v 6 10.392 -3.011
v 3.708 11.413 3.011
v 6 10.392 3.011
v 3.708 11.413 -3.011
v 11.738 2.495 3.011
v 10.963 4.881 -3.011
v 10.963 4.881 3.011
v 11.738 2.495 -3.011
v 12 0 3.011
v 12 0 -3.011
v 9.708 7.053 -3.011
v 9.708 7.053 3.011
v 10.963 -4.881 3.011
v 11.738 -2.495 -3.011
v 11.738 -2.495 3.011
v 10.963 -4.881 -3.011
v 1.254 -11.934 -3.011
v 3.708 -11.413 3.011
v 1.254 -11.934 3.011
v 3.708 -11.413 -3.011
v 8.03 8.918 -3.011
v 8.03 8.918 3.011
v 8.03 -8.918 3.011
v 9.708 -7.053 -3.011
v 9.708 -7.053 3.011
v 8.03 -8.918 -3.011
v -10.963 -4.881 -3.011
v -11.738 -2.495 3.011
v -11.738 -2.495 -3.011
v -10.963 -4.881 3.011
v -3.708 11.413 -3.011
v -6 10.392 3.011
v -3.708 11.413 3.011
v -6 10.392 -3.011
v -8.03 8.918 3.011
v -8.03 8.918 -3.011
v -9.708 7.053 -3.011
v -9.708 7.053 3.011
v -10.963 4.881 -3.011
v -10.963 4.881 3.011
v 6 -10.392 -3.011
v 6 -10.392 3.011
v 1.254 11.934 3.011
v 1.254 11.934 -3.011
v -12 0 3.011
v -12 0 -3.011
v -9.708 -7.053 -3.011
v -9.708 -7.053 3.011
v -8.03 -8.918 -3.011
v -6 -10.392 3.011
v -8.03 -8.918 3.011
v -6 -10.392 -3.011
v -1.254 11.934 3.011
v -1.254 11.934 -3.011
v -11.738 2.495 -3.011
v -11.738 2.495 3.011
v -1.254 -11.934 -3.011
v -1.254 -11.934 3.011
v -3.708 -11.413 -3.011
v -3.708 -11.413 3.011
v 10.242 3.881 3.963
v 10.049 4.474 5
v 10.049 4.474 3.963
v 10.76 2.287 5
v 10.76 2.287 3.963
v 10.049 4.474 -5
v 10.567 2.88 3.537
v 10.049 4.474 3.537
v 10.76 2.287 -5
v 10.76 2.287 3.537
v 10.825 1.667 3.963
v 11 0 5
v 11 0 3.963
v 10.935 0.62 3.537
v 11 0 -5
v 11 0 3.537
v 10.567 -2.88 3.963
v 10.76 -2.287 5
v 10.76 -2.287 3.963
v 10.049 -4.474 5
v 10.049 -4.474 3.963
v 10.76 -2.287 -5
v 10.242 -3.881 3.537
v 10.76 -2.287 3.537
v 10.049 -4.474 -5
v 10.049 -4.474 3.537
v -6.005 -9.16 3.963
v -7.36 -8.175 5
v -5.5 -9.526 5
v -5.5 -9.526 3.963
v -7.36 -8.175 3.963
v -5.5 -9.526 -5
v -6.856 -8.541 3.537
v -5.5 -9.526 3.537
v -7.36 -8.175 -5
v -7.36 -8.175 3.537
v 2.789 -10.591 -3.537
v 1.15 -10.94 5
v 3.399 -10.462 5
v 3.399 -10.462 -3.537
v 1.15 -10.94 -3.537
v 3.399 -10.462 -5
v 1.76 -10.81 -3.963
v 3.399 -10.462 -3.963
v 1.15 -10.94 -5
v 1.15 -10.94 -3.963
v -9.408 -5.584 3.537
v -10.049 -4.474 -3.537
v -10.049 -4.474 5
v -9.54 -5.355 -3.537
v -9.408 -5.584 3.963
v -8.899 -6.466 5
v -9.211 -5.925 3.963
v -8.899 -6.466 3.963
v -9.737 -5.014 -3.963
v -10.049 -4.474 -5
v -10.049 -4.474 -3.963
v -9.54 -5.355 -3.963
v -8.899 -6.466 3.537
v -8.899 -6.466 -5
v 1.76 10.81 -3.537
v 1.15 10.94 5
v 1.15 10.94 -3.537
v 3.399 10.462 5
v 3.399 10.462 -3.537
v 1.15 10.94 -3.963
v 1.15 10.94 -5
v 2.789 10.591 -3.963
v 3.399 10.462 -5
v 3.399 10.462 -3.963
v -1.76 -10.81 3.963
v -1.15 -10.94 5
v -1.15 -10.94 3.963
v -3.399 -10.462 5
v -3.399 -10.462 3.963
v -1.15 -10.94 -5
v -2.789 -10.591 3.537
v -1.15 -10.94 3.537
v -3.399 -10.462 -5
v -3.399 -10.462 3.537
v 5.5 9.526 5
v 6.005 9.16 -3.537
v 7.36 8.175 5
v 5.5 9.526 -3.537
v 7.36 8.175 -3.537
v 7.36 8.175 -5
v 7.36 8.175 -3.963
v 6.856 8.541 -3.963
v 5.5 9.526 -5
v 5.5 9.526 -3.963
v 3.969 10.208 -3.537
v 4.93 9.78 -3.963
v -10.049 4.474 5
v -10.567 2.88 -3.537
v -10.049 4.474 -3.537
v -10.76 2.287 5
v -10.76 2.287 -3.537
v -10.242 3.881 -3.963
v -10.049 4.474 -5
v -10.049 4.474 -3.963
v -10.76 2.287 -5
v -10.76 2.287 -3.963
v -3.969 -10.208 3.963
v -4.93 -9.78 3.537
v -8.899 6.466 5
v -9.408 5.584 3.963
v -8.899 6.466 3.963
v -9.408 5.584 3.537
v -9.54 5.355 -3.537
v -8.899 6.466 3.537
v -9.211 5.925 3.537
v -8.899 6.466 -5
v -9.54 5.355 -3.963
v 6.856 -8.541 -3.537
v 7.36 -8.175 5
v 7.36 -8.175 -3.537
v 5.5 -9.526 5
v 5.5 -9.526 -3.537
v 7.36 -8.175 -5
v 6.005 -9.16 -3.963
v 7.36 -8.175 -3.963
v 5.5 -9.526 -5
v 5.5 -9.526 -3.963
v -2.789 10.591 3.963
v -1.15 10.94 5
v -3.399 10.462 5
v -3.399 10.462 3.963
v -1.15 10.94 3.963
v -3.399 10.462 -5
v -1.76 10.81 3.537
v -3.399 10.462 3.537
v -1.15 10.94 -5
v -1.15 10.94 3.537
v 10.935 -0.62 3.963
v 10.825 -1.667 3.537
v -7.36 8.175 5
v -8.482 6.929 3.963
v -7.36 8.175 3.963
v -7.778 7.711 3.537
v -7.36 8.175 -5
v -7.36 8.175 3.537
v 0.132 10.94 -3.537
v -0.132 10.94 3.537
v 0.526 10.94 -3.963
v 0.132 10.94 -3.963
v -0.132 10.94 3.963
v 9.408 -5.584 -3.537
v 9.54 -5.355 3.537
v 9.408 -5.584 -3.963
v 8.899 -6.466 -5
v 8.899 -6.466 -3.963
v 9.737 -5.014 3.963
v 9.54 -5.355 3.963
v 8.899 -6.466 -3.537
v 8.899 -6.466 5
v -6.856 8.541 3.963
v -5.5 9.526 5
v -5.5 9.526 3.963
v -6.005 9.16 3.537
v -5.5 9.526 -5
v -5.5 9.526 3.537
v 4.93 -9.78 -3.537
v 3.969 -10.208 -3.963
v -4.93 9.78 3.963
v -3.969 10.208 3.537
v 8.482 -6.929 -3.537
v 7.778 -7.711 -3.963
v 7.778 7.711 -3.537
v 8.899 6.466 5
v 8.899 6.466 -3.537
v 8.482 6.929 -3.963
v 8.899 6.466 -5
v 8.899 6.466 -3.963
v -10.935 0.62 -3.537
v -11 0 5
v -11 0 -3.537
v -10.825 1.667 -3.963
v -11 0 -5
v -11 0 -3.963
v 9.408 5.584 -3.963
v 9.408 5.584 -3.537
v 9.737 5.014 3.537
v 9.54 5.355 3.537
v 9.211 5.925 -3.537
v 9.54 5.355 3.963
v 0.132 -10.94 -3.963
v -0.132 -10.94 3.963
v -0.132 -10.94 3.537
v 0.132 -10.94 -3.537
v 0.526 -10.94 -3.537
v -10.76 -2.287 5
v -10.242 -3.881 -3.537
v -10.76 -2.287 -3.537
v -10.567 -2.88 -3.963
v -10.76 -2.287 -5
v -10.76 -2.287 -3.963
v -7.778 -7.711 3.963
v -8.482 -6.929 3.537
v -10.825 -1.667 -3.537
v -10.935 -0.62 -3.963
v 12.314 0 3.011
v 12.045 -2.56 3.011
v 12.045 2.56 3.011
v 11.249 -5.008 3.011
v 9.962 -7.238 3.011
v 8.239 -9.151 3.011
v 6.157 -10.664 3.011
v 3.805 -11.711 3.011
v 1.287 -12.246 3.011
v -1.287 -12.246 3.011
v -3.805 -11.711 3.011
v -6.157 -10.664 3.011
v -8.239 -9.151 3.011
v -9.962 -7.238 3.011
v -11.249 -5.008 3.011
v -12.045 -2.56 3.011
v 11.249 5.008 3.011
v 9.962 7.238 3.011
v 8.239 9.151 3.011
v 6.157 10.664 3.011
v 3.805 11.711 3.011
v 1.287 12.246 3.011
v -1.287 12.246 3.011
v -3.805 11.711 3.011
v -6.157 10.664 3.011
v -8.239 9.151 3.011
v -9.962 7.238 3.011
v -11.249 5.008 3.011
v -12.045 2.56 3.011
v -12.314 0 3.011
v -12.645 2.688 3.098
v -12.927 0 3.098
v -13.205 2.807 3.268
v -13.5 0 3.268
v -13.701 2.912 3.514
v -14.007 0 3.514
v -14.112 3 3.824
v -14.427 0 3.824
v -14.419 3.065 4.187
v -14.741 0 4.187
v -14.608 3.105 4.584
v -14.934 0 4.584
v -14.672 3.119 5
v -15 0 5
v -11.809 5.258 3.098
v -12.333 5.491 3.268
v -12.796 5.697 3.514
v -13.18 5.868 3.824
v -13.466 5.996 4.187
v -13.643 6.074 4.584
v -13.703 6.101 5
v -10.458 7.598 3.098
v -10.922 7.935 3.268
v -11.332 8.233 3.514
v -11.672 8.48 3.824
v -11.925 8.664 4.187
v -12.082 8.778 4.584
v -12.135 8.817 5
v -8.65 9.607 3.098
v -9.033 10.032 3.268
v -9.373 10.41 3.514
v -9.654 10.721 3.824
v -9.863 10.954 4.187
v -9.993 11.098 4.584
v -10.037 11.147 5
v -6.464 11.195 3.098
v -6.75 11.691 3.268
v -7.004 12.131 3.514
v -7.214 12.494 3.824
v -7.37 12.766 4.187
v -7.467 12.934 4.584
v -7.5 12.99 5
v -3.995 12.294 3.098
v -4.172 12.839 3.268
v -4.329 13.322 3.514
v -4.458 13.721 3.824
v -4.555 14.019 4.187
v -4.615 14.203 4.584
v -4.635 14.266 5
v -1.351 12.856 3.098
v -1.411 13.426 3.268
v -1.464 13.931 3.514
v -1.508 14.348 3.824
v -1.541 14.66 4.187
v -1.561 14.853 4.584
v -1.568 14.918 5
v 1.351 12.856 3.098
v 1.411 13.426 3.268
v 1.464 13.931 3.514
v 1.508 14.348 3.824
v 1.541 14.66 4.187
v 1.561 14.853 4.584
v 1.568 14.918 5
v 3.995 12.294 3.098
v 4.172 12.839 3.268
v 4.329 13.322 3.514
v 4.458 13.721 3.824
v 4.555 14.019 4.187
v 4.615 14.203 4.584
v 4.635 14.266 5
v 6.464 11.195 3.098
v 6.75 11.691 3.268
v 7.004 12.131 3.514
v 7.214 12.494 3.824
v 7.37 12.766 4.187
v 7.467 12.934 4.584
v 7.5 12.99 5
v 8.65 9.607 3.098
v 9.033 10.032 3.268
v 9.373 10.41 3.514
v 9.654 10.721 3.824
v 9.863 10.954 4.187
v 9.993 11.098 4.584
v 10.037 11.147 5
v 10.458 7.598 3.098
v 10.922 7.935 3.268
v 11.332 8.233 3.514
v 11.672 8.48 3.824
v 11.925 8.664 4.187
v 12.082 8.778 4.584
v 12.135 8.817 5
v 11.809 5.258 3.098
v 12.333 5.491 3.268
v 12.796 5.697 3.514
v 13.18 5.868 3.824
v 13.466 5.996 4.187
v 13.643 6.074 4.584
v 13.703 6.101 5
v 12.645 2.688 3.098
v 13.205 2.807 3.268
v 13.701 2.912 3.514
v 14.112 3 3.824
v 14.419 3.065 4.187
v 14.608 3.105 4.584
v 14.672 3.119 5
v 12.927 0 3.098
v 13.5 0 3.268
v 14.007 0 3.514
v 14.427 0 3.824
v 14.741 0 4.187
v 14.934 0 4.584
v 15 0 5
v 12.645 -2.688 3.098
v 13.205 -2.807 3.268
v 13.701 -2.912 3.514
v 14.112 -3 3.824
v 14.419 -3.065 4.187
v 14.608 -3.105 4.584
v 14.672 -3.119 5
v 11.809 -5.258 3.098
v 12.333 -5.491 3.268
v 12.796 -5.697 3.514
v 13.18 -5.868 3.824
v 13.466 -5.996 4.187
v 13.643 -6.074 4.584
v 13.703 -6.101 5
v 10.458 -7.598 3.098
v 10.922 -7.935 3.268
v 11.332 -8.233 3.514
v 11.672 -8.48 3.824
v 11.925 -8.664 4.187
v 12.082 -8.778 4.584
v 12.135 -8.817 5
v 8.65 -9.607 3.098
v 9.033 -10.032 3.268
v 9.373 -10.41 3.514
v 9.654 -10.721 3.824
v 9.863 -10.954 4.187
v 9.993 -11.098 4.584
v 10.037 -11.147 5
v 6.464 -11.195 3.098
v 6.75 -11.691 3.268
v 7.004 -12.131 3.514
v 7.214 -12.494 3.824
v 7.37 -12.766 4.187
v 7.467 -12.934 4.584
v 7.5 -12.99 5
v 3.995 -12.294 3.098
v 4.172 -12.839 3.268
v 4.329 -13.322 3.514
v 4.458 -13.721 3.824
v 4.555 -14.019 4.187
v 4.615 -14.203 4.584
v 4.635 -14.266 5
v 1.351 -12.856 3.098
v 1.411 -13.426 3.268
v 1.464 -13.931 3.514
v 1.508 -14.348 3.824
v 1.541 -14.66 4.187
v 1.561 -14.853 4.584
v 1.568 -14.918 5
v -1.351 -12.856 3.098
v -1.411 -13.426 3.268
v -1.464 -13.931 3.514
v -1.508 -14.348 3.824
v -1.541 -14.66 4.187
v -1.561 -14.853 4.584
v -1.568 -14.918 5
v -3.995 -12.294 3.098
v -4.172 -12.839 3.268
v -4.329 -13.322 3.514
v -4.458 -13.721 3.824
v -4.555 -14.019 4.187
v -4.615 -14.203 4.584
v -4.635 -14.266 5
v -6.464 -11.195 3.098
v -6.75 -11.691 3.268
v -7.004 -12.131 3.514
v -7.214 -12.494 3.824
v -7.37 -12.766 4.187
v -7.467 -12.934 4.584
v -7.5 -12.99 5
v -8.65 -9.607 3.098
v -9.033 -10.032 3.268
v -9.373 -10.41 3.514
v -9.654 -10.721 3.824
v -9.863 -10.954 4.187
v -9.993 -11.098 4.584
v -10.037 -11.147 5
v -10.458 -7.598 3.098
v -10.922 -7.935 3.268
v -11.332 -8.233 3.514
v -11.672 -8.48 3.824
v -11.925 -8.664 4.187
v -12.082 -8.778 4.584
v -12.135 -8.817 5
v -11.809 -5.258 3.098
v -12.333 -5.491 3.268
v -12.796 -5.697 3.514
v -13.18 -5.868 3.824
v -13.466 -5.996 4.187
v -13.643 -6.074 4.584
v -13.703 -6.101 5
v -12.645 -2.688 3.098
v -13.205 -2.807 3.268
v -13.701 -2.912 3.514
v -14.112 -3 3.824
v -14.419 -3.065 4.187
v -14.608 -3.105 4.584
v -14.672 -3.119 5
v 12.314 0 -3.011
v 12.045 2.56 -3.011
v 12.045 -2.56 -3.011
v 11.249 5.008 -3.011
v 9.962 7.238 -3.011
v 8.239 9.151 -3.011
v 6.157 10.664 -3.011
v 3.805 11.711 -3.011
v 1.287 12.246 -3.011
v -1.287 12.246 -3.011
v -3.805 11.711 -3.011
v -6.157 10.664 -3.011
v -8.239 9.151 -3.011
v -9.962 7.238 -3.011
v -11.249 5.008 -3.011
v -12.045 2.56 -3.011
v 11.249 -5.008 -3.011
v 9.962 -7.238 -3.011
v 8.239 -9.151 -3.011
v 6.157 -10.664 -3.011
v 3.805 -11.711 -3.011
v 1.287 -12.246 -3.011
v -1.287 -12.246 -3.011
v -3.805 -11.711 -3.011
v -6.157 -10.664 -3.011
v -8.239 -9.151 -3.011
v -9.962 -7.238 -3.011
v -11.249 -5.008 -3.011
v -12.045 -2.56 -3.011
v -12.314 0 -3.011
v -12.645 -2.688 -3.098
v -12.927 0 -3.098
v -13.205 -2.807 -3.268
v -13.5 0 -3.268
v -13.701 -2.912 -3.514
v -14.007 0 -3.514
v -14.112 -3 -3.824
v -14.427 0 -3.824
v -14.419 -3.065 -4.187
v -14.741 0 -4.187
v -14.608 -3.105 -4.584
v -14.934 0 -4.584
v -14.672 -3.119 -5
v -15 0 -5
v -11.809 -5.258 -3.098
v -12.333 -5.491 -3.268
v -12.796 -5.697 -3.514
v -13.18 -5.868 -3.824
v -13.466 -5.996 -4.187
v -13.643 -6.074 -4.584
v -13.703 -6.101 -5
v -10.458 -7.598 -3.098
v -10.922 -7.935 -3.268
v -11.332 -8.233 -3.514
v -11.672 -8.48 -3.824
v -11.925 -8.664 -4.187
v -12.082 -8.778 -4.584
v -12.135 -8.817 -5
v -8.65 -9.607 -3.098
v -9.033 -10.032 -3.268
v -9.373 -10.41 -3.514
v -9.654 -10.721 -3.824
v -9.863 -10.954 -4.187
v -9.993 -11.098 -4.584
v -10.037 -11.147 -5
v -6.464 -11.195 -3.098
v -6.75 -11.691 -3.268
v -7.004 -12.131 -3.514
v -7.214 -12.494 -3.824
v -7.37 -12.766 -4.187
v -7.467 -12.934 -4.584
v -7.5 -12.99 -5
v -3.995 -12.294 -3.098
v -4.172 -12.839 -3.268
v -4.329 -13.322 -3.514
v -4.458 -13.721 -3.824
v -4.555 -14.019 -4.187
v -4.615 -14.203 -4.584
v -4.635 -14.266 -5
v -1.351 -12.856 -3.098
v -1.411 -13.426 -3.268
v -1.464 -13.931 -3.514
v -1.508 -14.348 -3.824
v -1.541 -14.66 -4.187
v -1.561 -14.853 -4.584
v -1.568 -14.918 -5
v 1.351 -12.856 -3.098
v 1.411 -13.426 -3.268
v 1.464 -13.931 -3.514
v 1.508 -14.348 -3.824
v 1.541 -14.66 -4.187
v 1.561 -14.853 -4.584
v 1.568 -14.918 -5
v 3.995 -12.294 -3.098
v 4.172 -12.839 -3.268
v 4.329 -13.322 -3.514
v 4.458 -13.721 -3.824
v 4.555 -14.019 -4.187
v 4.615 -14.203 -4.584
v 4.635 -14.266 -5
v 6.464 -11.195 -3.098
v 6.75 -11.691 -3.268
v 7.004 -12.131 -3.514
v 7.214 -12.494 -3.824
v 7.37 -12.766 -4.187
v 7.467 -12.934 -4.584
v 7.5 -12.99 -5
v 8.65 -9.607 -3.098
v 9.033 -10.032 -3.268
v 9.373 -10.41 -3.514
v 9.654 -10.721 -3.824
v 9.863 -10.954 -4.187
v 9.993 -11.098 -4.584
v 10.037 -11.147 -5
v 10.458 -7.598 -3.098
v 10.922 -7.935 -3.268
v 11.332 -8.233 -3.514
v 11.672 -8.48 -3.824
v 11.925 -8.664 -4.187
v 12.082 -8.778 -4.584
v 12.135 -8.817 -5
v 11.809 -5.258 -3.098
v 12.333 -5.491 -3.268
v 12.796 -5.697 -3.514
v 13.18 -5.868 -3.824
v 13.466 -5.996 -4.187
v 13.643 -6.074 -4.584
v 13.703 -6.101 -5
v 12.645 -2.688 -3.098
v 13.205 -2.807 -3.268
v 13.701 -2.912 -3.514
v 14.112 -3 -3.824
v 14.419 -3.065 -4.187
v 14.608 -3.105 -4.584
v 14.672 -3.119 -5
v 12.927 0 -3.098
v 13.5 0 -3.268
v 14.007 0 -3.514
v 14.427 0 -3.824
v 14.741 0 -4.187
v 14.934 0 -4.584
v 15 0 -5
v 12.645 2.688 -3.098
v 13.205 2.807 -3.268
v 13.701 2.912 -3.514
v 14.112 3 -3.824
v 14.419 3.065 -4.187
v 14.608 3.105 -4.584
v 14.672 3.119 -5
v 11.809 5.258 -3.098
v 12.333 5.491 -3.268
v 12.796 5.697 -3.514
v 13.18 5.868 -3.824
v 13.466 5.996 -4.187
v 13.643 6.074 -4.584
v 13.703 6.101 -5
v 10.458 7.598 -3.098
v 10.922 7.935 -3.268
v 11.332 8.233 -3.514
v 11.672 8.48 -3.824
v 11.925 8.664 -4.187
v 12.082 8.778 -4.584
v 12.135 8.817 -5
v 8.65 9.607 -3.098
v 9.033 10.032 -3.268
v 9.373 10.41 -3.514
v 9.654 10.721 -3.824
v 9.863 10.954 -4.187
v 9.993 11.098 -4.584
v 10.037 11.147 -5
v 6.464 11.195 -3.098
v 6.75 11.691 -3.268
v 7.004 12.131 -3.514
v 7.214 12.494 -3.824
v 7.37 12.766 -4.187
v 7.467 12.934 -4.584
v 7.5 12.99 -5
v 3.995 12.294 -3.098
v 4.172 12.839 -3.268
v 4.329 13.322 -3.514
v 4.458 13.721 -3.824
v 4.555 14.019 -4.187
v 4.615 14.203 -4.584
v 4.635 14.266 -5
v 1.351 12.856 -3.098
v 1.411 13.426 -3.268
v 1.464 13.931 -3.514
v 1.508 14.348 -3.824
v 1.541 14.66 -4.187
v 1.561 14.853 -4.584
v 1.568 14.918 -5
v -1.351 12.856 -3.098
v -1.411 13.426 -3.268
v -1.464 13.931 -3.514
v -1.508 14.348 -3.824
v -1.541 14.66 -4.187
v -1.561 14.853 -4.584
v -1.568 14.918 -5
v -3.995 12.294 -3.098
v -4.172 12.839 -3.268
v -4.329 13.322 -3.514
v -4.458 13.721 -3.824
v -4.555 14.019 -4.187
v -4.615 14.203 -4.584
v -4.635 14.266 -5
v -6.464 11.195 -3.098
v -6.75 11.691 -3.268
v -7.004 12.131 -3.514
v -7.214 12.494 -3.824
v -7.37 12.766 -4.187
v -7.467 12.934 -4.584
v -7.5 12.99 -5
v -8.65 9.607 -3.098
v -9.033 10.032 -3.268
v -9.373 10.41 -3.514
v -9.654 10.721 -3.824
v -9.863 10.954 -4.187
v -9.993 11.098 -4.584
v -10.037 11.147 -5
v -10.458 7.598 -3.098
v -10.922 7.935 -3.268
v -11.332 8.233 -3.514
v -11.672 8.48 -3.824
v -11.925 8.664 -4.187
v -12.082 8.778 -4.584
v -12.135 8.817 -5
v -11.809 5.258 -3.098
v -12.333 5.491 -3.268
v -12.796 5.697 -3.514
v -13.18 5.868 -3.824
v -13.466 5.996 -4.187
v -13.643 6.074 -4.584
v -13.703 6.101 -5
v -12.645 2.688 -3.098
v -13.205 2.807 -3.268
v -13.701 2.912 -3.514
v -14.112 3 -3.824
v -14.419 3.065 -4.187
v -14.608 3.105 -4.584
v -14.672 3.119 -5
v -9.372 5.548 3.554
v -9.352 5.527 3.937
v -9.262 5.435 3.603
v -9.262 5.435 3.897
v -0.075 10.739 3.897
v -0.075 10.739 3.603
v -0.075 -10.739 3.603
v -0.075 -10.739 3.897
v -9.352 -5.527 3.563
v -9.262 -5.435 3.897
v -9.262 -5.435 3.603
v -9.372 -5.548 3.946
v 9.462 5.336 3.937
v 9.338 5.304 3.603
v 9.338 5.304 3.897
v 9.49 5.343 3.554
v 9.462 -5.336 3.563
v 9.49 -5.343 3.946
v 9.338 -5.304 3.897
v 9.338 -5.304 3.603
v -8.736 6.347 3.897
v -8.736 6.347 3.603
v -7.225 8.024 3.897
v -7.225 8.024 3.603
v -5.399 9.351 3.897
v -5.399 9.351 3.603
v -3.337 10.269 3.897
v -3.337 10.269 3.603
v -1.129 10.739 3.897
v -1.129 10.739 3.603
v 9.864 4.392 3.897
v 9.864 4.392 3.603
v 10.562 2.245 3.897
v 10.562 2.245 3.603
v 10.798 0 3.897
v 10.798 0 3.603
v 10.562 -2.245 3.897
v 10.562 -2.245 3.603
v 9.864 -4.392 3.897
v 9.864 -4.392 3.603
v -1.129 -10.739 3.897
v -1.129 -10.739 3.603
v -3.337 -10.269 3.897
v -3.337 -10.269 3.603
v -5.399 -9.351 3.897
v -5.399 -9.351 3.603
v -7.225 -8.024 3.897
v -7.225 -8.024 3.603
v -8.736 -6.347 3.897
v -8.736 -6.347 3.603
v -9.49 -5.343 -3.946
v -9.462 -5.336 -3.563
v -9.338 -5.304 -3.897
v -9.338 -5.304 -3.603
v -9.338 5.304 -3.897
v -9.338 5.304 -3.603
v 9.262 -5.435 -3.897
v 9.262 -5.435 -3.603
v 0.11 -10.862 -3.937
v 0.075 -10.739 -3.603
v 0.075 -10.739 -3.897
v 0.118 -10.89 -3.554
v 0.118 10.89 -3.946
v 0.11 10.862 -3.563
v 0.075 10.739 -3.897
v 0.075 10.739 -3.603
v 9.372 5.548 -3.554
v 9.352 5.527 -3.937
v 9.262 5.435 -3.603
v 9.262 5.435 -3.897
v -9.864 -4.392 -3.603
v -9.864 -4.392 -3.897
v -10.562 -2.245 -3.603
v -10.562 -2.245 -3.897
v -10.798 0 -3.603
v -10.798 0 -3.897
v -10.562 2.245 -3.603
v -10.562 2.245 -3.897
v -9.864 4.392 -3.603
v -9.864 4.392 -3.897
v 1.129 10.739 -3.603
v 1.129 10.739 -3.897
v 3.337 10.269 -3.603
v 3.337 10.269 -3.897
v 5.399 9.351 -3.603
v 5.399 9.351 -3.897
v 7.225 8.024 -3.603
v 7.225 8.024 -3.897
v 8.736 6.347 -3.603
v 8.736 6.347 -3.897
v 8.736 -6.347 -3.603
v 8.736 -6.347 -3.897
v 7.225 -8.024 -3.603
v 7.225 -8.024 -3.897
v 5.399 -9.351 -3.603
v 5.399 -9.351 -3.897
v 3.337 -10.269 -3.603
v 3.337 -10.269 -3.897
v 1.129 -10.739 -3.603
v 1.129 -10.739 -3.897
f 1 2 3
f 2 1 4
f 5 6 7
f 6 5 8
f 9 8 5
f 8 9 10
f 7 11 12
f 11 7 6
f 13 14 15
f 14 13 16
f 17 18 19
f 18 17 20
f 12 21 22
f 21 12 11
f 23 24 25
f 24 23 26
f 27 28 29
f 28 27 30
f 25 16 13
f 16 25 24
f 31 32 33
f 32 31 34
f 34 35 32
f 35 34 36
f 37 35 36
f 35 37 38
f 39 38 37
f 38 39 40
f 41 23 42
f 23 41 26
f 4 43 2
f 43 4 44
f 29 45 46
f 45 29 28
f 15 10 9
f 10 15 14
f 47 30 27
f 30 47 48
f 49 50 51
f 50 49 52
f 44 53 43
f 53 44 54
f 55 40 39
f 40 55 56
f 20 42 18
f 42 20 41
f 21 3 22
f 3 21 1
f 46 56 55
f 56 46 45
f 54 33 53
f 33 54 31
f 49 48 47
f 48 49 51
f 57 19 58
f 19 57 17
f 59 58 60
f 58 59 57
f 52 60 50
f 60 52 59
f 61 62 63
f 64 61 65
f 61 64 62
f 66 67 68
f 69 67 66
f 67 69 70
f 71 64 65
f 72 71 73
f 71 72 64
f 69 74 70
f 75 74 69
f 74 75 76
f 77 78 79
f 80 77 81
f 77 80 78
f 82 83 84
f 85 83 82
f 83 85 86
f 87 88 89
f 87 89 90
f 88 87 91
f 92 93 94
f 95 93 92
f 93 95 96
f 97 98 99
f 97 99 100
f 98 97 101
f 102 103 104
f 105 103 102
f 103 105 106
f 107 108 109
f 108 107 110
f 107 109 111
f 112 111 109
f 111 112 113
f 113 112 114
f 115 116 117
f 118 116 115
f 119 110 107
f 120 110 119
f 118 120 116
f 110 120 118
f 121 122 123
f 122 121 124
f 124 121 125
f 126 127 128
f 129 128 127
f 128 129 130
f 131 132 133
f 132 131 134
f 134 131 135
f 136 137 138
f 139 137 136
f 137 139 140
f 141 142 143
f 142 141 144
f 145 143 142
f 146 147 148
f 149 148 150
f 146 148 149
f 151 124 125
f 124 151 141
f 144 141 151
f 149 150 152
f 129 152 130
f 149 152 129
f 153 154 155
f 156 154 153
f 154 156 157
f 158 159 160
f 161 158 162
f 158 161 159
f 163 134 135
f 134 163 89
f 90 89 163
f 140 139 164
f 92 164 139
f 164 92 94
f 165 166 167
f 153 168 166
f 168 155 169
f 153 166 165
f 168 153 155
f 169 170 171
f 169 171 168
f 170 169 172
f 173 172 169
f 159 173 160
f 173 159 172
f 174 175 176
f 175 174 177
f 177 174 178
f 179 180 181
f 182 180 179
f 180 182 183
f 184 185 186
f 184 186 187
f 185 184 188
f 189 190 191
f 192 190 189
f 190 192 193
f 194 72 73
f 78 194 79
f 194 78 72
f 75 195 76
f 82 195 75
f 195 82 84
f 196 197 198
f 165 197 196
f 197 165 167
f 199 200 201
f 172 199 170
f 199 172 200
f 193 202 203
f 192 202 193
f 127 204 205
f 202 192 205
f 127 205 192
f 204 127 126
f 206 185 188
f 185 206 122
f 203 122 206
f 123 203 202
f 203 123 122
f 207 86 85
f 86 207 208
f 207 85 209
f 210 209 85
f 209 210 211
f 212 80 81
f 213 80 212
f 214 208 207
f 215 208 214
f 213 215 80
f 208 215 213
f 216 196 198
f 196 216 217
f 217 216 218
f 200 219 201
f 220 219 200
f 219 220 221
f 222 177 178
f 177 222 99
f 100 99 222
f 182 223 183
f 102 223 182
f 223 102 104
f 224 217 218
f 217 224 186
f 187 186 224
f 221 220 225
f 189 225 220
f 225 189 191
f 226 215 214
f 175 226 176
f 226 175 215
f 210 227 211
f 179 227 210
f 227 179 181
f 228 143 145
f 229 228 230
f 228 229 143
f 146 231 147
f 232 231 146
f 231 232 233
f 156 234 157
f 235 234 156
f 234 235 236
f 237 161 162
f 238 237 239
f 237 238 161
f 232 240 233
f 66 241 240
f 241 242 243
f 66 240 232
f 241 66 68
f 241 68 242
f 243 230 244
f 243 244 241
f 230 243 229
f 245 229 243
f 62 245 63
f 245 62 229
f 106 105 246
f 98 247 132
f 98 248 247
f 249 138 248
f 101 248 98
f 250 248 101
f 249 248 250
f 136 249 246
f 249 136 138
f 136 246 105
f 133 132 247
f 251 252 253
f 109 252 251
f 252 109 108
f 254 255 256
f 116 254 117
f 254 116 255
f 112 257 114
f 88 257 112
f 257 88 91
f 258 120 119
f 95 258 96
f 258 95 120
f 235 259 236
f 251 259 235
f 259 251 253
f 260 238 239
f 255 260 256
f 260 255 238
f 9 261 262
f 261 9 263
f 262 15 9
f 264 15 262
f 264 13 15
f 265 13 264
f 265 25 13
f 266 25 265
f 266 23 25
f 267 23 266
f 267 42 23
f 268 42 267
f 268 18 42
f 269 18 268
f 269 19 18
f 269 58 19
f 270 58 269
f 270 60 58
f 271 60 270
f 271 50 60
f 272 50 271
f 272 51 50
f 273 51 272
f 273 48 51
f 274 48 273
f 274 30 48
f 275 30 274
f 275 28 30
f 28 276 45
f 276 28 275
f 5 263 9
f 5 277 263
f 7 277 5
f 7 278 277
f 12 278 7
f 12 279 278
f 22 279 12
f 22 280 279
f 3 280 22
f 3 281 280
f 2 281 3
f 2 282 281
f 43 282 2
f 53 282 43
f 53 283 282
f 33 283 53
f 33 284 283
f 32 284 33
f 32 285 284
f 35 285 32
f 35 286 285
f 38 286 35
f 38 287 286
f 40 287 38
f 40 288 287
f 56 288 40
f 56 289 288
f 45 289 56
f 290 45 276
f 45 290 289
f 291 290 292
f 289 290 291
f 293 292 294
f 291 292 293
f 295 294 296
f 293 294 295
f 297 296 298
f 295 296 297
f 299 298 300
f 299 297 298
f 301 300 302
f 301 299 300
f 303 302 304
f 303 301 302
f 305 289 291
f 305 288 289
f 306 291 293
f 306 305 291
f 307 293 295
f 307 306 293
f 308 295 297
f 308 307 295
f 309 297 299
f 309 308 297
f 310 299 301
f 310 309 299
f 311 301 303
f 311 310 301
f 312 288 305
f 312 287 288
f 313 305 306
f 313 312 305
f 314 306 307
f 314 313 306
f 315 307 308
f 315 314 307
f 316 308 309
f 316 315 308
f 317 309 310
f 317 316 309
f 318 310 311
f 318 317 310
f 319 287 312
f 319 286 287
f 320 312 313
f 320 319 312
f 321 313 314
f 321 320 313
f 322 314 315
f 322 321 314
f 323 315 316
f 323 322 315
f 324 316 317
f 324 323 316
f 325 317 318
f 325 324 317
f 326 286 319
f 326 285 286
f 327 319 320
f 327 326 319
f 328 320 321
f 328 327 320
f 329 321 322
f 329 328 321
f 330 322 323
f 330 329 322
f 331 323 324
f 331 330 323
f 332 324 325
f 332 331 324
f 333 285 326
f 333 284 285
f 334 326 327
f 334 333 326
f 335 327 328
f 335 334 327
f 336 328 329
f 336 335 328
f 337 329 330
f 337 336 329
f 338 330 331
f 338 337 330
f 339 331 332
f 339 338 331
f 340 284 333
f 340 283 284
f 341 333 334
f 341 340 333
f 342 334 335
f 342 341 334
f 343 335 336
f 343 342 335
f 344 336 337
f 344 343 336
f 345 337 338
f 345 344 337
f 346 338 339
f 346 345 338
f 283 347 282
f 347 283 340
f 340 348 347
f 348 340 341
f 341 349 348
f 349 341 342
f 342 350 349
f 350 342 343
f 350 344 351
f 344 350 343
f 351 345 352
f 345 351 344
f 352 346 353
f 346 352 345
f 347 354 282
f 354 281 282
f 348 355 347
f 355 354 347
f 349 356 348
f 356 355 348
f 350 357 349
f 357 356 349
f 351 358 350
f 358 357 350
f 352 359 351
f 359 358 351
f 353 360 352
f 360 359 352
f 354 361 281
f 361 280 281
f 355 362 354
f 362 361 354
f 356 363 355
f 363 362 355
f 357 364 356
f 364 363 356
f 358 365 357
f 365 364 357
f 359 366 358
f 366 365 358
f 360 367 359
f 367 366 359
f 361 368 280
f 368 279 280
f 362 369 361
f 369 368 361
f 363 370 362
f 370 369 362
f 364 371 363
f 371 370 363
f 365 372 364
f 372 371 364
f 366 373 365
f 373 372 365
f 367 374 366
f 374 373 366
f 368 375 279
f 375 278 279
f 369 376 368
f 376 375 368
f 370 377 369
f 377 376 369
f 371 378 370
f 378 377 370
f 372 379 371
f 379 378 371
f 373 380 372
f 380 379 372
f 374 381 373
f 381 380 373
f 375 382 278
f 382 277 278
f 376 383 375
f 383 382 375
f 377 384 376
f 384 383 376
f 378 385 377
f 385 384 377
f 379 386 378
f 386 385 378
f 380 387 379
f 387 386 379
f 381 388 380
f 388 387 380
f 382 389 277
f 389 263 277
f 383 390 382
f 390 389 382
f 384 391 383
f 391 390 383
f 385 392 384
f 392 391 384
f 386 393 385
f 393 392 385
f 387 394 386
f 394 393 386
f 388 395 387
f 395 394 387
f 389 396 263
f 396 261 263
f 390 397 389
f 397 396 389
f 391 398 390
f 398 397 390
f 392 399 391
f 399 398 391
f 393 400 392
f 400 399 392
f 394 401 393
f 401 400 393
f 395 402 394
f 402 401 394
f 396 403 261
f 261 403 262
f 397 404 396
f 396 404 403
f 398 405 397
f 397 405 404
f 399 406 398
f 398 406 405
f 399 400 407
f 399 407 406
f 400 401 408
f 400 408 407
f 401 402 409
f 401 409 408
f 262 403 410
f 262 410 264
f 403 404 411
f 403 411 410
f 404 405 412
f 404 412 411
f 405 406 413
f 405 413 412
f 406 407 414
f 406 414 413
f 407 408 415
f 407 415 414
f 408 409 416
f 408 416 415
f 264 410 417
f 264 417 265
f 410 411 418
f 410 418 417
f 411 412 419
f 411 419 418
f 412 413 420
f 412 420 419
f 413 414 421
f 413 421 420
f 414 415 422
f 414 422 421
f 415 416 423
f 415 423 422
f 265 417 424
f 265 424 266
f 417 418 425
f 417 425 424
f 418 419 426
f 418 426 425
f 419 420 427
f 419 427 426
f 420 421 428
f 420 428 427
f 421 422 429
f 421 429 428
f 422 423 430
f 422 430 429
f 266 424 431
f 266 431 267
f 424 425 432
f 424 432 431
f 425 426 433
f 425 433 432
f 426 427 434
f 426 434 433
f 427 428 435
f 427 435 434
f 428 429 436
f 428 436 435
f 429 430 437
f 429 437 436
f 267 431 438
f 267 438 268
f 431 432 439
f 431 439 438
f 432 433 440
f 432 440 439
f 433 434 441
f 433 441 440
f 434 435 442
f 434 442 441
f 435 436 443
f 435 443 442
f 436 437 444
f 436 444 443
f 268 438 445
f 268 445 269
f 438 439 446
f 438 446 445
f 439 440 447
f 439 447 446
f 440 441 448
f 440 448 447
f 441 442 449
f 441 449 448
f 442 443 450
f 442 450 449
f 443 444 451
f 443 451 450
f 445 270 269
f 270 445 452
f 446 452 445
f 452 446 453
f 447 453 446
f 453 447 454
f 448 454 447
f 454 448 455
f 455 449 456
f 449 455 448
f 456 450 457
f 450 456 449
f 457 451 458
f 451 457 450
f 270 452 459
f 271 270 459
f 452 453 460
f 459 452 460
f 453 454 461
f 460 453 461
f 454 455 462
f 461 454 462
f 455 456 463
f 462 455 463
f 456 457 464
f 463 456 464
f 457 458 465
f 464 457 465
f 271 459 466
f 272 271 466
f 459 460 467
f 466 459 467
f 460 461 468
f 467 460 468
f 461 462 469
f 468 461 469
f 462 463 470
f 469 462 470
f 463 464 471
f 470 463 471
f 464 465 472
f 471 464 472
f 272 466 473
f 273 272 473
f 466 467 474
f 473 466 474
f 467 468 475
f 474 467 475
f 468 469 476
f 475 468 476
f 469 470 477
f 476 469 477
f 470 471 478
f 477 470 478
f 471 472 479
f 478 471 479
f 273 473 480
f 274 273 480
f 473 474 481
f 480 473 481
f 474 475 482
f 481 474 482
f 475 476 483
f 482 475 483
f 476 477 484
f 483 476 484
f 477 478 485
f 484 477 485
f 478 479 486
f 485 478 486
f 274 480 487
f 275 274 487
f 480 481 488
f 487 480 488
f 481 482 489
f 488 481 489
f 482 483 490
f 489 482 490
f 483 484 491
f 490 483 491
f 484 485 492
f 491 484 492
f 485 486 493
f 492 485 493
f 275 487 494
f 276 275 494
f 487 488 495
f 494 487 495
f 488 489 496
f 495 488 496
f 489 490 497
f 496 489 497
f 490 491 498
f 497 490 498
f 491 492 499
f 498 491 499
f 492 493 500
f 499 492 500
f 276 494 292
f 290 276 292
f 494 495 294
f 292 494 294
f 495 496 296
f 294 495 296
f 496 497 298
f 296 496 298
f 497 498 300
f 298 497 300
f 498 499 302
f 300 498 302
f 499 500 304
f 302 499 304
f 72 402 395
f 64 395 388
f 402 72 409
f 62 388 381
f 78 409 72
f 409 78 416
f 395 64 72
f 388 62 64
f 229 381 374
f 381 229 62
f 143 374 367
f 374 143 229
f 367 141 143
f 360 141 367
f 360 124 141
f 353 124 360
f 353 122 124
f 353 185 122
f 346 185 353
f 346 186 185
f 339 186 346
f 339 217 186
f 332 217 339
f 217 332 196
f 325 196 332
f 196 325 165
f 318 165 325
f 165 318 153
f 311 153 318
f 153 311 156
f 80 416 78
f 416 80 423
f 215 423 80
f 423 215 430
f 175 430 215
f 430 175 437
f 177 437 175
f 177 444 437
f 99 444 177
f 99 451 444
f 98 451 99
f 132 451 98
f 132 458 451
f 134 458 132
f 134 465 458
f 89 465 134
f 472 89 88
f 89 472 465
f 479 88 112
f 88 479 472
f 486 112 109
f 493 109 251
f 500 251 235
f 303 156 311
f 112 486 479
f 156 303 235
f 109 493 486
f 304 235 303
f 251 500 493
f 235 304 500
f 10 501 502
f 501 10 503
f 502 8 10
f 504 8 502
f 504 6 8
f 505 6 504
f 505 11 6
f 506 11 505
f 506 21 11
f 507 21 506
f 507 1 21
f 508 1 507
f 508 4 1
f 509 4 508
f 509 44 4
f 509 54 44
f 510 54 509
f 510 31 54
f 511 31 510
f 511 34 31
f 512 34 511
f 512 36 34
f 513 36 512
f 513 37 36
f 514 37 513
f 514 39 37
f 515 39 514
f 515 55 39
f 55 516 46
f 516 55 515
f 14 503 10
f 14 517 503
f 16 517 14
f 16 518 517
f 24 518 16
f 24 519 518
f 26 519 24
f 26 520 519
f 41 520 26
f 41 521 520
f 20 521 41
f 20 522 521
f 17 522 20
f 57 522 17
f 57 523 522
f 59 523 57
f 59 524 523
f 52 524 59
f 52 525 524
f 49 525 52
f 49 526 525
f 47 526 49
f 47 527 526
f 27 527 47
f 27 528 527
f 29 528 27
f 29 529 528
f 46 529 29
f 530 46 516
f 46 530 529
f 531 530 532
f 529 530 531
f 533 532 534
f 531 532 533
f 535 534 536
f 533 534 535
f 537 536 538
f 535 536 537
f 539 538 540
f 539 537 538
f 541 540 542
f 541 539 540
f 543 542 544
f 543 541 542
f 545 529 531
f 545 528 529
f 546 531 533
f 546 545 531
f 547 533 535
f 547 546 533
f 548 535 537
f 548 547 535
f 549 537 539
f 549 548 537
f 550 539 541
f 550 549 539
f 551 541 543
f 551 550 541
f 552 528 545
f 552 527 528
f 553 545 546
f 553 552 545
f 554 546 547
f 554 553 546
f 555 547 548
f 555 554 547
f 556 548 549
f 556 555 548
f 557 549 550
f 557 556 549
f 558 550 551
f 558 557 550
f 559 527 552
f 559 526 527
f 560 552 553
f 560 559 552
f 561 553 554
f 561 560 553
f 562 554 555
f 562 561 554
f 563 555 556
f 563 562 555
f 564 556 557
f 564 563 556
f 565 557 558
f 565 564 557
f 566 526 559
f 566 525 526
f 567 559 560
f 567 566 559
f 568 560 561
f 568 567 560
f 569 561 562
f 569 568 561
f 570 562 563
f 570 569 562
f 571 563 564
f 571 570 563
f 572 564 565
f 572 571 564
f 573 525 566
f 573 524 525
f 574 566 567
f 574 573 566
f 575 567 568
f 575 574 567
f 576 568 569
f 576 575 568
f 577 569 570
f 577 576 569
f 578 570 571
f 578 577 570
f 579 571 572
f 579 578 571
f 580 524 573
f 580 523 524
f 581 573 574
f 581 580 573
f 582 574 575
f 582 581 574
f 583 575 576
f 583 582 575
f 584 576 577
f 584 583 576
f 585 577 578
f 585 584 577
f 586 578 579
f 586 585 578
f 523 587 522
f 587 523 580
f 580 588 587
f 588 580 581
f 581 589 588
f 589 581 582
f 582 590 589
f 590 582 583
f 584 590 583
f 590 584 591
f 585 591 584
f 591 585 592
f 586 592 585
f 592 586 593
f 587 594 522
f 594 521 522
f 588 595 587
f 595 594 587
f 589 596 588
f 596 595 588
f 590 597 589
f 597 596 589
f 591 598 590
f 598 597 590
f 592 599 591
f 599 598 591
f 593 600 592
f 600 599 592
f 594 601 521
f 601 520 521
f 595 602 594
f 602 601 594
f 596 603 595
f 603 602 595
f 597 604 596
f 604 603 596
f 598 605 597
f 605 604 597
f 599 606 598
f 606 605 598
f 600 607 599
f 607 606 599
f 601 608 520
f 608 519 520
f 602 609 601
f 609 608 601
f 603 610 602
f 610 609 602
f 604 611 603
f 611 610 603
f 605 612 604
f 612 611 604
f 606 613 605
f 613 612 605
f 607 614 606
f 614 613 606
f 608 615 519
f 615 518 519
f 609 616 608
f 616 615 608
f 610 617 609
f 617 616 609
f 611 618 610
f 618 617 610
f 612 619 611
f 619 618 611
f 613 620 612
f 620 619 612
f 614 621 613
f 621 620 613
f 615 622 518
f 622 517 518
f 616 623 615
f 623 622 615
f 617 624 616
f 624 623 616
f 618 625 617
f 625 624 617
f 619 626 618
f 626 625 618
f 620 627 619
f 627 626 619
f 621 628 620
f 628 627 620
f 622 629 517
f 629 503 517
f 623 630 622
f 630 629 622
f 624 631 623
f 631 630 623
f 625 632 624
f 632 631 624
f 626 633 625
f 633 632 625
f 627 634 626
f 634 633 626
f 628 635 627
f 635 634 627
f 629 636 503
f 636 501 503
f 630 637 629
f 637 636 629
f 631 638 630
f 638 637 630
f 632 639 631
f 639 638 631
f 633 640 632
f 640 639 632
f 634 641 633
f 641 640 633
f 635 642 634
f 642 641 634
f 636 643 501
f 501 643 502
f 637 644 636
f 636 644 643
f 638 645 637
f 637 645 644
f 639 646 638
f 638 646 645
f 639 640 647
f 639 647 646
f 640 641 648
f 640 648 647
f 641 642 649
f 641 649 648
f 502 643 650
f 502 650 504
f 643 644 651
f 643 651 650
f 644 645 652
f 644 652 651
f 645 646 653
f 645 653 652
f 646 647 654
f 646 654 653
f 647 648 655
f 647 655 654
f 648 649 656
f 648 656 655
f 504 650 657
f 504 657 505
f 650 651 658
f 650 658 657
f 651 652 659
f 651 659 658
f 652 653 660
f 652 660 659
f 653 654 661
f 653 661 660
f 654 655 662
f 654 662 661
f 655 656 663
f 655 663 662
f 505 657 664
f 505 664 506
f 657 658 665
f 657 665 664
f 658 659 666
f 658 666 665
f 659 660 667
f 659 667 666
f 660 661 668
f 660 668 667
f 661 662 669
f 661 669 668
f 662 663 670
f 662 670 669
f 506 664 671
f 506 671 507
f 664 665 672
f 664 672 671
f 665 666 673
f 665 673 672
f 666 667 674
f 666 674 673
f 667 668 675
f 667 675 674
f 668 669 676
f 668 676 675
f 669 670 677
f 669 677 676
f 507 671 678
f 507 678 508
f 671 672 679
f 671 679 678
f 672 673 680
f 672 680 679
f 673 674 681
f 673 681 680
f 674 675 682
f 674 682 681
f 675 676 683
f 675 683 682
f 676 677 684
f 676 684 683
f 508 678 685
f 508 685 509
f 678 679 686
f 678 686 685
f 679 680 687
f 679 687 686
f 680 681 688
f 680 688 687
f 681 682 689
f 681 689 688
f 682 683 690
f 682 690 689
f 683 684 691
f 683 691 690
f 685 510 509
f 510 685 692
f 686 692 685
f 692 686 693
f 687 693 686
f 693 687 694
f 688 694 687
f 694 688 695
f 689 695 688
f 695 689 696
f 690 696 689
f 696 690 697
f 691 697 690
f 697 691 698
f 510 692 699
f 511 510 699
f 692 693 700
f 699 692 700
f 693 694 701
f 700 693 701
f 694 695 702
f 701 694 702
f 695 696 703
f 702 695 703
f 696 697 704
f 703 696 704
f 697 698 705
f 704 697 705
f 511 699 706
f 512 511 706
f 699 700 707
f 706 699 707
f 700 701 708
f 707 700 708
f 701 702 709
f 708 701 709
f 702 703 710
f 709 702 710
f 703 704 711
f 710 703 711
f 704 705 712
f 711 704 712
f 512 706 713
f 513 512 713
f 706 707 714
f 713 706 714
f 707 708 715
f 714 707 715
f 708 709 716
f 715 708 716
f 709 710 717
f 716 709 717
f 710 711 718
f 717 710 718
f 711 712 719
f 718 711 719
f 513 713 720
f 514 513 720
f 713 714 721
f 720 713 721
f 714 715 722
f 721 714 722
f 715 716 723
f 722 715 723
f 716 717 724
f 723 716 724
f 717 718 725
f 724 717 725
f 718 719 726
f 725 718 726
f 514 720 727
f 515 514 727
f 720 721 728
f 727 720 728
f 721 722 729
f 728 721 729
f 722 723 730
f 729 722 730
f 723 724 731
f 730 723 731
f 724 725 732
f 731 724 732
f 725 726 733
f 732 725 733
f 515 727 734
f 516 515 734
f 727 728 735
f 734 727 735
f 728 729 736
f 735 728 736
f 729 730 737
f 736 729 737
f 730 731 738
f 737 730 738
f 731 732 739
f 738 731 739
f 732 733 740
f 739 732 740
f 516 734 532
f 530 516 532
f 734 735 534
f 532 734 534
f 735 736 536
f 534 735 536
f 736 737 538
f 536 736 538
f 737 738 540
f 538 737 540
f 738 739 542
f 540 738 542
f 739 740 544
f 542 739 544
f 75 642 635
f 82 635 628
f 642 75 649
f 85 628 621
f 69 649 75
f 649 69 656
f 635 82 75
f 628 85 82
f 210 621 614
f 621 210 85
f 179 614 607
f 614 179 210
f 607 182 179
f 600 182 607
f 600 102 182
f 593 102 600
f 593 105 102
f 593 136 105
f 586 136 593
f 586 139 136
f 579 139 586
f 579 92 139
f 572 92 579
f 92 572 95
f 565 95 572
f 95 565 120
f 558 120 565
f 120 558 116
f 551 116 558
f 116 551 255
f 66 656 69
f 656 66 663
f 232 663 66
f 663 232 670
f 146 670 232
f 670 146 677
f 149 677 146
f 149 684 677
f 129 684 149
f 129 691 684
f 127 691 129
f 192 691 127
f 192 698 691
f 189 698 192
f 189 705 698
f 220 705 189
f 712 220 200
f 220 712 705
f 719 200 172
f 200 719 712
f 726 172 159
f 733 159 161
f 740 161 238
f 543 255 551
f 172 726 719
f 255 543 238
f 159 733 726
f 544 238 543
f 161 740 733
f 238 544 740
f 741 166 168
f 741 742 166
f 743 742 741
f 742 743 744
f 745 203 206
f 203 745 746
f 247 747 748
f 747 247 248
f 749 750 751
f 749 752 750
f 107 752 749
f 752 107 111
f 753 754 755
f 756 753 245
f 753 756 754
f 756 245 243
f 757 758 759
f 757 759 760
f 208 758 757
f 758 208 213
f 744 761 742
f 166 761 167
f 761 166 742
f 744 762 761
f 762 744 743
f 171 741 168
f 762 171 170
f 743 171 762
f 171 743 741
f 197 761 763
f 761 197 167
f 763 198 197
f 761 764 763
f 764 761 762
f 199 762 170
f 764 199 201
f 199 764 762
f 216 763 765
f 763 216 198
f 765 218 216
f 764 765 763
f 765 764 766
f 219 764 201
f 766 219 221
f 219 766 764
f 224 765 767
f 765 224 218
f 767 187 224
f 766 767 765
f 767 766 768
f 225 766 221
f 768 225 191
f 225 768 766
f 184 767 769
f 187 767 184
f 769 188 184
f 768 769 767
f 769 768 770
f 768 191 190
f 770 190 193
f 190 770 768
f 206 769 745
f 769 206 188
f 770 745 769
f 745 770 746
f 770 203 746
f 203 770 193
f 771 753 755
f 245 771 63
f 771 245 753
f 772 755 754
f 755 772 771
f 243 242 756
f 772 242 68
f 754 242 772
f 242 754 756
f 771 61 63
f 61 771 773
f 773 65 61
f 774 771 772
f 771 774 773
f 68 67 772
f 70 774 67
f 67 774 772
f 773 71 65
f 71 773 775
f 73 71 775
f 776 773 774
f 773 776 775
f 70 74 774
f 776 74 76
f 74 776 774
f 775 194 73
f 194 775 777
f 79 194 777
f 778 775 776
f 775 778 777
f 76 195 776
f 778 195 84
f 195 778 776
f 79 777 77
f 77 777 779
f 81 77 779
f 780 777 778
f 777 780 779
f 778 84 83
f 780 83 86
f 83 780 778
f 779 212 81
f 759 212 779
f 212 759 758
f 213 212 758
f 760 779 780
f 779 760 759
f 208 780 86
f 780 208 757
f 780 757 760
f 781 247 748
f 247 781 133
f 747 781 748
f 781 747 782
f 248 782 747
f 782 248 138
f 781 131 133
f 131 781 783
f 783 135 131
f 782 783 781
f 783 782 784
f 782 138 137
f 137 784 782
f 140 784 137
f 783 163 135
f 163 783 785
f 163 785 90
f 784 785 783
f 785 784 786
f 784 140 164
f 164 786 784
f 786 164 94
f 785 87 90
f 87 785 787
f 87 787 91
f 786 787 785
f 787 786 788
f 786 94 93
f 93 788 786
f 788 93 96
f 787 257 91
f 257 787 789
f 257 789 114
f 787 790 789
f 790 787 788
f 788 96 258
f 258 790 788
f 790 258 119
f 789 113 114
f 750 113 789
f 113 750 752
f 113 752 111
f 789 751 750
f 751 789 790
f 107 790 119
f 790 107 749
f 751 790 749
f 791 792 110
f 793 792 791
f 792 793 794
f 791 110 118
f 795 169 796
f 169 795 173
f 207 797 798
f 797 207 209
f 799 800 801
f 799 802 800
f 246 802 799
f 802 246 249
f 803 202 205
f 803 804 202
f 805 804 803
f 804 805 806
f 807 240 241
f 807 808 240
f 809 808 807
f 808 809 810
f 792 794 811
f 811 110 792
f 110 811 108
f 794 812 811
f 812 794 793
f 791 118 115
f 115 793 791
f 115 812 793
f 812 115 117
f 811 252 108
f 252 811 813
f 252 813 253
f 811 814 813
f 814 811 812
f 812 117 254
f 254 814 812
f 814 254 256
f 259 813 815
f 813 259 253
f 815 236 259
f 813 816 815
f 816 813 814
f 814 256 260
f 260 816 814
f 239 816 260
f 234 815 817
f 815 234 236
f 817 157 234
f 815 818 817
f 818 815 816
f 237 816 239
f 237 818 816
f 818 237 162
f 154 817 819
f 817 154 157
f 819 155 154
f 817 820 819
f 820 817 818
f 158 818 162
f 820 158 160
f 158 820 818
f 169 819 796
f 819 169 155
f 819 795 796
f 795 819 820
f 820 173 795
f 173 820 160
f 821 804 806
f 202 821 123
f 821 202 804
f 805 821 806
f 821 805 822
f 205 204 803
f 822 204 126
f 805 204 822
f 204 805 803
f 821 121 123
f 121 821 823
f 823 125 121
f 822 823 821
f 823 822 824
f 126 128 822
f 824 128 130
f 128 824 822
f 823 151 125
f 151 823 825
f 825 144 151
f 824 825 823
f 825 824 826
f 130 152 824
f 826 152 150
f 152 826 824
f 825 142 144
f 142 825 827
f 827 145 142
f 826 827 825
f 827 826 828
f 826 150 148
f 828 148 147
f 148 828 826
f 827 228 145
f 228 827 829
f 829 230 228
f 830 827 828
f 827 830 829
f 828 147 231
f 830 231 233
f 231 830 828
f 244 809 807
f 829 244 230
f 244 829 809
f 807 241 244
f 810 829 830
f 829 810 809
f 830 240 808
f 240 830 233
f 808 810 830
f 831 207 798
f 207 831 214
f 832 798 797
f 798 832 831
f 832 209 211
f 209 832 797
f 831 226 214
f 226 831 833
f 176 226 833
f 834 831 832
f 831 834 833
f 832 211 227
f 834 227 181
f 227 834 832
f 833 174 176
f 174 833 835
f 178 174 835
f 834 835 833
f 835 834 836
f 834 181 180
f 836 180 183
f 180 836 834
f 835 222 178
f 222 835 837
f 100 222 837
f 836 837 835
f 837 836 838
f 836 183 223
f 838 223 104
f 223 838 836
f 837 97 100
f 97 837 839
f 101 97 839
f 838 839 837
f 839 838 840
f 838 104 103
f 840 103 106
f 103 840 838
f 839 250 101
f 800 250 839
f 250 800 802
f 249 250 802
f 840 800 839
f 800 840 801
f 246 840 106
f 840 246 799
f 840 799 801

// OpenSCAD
// Copyright (c) 2013 by Jean-Louis Paquelin (jlp6k).
// This work is licensed under the Creative Commons Attribution
// Partage dans les Mêmes Conditions 3.0 France License.
// To view a copy of this license, visit http://creativecommons.org/licenses/by-sa/3.0/fr/
// CC-BY-SA

// Inspired by http://www.thingiverse.com/thing:3970
// Created 2013-02-20
// Last modified 2013-02-20

// dimensions are set in millimeters

Bearing_Outer_Diameter = 22;
Bearing_Width = 7;

Belt_Width = 6;

Pulley_Thickness = 1;

Flange_Depth = 3;
Flange_Thickness = 2;
Flange_Shape = 2; // [1:square, 2:round]

Rim_Thickness = 0.5;
Rim_Count = 3;

pulley(Bearing_Outer_Diameter, Bearing_Width, Belt_Width, Pulley_Thickness, Flange_Depth, Flange_Thickness, Flange_Shape, Rim_Thickness, Rim_Count);

module pulley(Bearing_Outer_Diameter, Bearing_Width, Belt_Width, Pulley_Thickness, Flange_Depth, Flange_Thickness, Flange_Shape, Rim_Thickness, Rim_Count) {
    width = max(Bearing_Width, Belt_Width);
    union() {
        // pulley base
        difference() {
            cylinder(h = width + (Rim_Thickness * 2), r = (Bearing_Outer_Diameter / 2) + Pulley_Thickness, center = true);
            cylinder(h = width + (Rim_Thickness * 2) + 1, r = (Bearing_Outer_Diameter / 2), center = true);
        }
        
        // add pulley flanges
        translate([0, 0, (Belt_Width + Flange_Thickness) / 2])
            pulley_flange(Bearing_Outer_Diameter, Pulley_Thickness, Flange_Depth, Flange_Thickness, Flange_Shape);
        translate([0, 0, -(Belt_Width + Flange_Thickness) / 2])
            rotate([180, 0, 0])
                pulley_flange(Bearing_Outer_Diameter, Pulley_Thickness, Flange_Depth, Flange_Thickness, Flange_Shape);
            
        // add pulley rims
        translate([0, 0, (Bearing_Width + Rim_Thickness) / 2])
            pulley_rim(Bearing_Outer_Diameter, Rim_Thickness, Rim_Count);
        translate([0, 0, -(Bearing_Width + Rim_Thickness) / 2])
            rotate([0, 0, 180 / Rim_Count])
                pulley_rim(Bearing_Outer_Diameter, Rim_Thickness, Rim_Count);
    }
}

module pulley_flange(Bearing_Outer_Diameter, Pulley_Thickness, Flange_Depth, Flange_Thickness, Flange_Shape) {
    if(Flange_Shape == 2) {
        // round flange
        translate([0, 0, Flange_Thickness / 2])
            difference() {
                union() {
                    rotate_extrude(convexity = 10)
                        translate([(Bearing_Outer_Diameter / 2) + Pulley_Thickness, 0, 0])
                            scale([Flange_Depth / Flange_Thickness, 1, 1])
                                circle(r = Flange_Thickness, $fn = 30);
                    cylinder(h = Flange_Thickness * 2, r = (Bearing_Outer_Diameter / 2) + Pulley_Thickness, center = true);
                }
                cylinder(h = (Flange_Thickness * 2) + 1, r = (Bearing_Outer_Diameter / 2), center = true);
                translate([0, 0, (Flange_Thickness + 1)/ 2])
                    cube([Bearing_Outer_Diameter + (2 * (Pulley_Thickness + Flange_Depth)), Bearing_Outer_Diameter + (2 * (Pulley_Thickness + Flange_Depth)), Flange_Thickness + 1], center = true);
            }
    } else {
        // square flange
        difference() {
            cylinder(h = Flange_Thickness, r = (Bearing_Outer_Diameter / 2) + Pulley_Thickness + Flange_Depth, center = true);
            cylinder(h = Flange_Thickness + 1, r = (Bearing_Outer_Diameter / 2), center = true);
        }
    }
}

module pulley_full_rim(Bearing_Outer_Diameter, Rim_Thickness) {
    rotate_extrude(convexity = 10)
        translate([Bearing_Outer_Diameter / 2, 0, 0])
            circle(r = Rim_Thickness / 2);
}

module pulley_rim(Bearing_Outer_Diameter, Rim_Thickness, Rim_Count) {
    if(Rim_Count < 2) {
        pulley_full_rim(Bearing_Outer_Diameter, Rim_Thickness);
    } else {
        intersection() {
            pulley_full_rim(Bearing_Outer_Diameter, Rim_Thickness);
            union() {
                for(index = [1 : Rim_Count]) {
                    rotate([0, 0, (index * 360) / Rim_Count])
                        translate([(Bearing_Outer_Diameter + Rim_Thickness)/ 2, 0, 0])
                            sphere(r = (Bearing_Outer_Diameter * PI) / (Rim_Count * 4));
                }
            }
        }
    }
}
